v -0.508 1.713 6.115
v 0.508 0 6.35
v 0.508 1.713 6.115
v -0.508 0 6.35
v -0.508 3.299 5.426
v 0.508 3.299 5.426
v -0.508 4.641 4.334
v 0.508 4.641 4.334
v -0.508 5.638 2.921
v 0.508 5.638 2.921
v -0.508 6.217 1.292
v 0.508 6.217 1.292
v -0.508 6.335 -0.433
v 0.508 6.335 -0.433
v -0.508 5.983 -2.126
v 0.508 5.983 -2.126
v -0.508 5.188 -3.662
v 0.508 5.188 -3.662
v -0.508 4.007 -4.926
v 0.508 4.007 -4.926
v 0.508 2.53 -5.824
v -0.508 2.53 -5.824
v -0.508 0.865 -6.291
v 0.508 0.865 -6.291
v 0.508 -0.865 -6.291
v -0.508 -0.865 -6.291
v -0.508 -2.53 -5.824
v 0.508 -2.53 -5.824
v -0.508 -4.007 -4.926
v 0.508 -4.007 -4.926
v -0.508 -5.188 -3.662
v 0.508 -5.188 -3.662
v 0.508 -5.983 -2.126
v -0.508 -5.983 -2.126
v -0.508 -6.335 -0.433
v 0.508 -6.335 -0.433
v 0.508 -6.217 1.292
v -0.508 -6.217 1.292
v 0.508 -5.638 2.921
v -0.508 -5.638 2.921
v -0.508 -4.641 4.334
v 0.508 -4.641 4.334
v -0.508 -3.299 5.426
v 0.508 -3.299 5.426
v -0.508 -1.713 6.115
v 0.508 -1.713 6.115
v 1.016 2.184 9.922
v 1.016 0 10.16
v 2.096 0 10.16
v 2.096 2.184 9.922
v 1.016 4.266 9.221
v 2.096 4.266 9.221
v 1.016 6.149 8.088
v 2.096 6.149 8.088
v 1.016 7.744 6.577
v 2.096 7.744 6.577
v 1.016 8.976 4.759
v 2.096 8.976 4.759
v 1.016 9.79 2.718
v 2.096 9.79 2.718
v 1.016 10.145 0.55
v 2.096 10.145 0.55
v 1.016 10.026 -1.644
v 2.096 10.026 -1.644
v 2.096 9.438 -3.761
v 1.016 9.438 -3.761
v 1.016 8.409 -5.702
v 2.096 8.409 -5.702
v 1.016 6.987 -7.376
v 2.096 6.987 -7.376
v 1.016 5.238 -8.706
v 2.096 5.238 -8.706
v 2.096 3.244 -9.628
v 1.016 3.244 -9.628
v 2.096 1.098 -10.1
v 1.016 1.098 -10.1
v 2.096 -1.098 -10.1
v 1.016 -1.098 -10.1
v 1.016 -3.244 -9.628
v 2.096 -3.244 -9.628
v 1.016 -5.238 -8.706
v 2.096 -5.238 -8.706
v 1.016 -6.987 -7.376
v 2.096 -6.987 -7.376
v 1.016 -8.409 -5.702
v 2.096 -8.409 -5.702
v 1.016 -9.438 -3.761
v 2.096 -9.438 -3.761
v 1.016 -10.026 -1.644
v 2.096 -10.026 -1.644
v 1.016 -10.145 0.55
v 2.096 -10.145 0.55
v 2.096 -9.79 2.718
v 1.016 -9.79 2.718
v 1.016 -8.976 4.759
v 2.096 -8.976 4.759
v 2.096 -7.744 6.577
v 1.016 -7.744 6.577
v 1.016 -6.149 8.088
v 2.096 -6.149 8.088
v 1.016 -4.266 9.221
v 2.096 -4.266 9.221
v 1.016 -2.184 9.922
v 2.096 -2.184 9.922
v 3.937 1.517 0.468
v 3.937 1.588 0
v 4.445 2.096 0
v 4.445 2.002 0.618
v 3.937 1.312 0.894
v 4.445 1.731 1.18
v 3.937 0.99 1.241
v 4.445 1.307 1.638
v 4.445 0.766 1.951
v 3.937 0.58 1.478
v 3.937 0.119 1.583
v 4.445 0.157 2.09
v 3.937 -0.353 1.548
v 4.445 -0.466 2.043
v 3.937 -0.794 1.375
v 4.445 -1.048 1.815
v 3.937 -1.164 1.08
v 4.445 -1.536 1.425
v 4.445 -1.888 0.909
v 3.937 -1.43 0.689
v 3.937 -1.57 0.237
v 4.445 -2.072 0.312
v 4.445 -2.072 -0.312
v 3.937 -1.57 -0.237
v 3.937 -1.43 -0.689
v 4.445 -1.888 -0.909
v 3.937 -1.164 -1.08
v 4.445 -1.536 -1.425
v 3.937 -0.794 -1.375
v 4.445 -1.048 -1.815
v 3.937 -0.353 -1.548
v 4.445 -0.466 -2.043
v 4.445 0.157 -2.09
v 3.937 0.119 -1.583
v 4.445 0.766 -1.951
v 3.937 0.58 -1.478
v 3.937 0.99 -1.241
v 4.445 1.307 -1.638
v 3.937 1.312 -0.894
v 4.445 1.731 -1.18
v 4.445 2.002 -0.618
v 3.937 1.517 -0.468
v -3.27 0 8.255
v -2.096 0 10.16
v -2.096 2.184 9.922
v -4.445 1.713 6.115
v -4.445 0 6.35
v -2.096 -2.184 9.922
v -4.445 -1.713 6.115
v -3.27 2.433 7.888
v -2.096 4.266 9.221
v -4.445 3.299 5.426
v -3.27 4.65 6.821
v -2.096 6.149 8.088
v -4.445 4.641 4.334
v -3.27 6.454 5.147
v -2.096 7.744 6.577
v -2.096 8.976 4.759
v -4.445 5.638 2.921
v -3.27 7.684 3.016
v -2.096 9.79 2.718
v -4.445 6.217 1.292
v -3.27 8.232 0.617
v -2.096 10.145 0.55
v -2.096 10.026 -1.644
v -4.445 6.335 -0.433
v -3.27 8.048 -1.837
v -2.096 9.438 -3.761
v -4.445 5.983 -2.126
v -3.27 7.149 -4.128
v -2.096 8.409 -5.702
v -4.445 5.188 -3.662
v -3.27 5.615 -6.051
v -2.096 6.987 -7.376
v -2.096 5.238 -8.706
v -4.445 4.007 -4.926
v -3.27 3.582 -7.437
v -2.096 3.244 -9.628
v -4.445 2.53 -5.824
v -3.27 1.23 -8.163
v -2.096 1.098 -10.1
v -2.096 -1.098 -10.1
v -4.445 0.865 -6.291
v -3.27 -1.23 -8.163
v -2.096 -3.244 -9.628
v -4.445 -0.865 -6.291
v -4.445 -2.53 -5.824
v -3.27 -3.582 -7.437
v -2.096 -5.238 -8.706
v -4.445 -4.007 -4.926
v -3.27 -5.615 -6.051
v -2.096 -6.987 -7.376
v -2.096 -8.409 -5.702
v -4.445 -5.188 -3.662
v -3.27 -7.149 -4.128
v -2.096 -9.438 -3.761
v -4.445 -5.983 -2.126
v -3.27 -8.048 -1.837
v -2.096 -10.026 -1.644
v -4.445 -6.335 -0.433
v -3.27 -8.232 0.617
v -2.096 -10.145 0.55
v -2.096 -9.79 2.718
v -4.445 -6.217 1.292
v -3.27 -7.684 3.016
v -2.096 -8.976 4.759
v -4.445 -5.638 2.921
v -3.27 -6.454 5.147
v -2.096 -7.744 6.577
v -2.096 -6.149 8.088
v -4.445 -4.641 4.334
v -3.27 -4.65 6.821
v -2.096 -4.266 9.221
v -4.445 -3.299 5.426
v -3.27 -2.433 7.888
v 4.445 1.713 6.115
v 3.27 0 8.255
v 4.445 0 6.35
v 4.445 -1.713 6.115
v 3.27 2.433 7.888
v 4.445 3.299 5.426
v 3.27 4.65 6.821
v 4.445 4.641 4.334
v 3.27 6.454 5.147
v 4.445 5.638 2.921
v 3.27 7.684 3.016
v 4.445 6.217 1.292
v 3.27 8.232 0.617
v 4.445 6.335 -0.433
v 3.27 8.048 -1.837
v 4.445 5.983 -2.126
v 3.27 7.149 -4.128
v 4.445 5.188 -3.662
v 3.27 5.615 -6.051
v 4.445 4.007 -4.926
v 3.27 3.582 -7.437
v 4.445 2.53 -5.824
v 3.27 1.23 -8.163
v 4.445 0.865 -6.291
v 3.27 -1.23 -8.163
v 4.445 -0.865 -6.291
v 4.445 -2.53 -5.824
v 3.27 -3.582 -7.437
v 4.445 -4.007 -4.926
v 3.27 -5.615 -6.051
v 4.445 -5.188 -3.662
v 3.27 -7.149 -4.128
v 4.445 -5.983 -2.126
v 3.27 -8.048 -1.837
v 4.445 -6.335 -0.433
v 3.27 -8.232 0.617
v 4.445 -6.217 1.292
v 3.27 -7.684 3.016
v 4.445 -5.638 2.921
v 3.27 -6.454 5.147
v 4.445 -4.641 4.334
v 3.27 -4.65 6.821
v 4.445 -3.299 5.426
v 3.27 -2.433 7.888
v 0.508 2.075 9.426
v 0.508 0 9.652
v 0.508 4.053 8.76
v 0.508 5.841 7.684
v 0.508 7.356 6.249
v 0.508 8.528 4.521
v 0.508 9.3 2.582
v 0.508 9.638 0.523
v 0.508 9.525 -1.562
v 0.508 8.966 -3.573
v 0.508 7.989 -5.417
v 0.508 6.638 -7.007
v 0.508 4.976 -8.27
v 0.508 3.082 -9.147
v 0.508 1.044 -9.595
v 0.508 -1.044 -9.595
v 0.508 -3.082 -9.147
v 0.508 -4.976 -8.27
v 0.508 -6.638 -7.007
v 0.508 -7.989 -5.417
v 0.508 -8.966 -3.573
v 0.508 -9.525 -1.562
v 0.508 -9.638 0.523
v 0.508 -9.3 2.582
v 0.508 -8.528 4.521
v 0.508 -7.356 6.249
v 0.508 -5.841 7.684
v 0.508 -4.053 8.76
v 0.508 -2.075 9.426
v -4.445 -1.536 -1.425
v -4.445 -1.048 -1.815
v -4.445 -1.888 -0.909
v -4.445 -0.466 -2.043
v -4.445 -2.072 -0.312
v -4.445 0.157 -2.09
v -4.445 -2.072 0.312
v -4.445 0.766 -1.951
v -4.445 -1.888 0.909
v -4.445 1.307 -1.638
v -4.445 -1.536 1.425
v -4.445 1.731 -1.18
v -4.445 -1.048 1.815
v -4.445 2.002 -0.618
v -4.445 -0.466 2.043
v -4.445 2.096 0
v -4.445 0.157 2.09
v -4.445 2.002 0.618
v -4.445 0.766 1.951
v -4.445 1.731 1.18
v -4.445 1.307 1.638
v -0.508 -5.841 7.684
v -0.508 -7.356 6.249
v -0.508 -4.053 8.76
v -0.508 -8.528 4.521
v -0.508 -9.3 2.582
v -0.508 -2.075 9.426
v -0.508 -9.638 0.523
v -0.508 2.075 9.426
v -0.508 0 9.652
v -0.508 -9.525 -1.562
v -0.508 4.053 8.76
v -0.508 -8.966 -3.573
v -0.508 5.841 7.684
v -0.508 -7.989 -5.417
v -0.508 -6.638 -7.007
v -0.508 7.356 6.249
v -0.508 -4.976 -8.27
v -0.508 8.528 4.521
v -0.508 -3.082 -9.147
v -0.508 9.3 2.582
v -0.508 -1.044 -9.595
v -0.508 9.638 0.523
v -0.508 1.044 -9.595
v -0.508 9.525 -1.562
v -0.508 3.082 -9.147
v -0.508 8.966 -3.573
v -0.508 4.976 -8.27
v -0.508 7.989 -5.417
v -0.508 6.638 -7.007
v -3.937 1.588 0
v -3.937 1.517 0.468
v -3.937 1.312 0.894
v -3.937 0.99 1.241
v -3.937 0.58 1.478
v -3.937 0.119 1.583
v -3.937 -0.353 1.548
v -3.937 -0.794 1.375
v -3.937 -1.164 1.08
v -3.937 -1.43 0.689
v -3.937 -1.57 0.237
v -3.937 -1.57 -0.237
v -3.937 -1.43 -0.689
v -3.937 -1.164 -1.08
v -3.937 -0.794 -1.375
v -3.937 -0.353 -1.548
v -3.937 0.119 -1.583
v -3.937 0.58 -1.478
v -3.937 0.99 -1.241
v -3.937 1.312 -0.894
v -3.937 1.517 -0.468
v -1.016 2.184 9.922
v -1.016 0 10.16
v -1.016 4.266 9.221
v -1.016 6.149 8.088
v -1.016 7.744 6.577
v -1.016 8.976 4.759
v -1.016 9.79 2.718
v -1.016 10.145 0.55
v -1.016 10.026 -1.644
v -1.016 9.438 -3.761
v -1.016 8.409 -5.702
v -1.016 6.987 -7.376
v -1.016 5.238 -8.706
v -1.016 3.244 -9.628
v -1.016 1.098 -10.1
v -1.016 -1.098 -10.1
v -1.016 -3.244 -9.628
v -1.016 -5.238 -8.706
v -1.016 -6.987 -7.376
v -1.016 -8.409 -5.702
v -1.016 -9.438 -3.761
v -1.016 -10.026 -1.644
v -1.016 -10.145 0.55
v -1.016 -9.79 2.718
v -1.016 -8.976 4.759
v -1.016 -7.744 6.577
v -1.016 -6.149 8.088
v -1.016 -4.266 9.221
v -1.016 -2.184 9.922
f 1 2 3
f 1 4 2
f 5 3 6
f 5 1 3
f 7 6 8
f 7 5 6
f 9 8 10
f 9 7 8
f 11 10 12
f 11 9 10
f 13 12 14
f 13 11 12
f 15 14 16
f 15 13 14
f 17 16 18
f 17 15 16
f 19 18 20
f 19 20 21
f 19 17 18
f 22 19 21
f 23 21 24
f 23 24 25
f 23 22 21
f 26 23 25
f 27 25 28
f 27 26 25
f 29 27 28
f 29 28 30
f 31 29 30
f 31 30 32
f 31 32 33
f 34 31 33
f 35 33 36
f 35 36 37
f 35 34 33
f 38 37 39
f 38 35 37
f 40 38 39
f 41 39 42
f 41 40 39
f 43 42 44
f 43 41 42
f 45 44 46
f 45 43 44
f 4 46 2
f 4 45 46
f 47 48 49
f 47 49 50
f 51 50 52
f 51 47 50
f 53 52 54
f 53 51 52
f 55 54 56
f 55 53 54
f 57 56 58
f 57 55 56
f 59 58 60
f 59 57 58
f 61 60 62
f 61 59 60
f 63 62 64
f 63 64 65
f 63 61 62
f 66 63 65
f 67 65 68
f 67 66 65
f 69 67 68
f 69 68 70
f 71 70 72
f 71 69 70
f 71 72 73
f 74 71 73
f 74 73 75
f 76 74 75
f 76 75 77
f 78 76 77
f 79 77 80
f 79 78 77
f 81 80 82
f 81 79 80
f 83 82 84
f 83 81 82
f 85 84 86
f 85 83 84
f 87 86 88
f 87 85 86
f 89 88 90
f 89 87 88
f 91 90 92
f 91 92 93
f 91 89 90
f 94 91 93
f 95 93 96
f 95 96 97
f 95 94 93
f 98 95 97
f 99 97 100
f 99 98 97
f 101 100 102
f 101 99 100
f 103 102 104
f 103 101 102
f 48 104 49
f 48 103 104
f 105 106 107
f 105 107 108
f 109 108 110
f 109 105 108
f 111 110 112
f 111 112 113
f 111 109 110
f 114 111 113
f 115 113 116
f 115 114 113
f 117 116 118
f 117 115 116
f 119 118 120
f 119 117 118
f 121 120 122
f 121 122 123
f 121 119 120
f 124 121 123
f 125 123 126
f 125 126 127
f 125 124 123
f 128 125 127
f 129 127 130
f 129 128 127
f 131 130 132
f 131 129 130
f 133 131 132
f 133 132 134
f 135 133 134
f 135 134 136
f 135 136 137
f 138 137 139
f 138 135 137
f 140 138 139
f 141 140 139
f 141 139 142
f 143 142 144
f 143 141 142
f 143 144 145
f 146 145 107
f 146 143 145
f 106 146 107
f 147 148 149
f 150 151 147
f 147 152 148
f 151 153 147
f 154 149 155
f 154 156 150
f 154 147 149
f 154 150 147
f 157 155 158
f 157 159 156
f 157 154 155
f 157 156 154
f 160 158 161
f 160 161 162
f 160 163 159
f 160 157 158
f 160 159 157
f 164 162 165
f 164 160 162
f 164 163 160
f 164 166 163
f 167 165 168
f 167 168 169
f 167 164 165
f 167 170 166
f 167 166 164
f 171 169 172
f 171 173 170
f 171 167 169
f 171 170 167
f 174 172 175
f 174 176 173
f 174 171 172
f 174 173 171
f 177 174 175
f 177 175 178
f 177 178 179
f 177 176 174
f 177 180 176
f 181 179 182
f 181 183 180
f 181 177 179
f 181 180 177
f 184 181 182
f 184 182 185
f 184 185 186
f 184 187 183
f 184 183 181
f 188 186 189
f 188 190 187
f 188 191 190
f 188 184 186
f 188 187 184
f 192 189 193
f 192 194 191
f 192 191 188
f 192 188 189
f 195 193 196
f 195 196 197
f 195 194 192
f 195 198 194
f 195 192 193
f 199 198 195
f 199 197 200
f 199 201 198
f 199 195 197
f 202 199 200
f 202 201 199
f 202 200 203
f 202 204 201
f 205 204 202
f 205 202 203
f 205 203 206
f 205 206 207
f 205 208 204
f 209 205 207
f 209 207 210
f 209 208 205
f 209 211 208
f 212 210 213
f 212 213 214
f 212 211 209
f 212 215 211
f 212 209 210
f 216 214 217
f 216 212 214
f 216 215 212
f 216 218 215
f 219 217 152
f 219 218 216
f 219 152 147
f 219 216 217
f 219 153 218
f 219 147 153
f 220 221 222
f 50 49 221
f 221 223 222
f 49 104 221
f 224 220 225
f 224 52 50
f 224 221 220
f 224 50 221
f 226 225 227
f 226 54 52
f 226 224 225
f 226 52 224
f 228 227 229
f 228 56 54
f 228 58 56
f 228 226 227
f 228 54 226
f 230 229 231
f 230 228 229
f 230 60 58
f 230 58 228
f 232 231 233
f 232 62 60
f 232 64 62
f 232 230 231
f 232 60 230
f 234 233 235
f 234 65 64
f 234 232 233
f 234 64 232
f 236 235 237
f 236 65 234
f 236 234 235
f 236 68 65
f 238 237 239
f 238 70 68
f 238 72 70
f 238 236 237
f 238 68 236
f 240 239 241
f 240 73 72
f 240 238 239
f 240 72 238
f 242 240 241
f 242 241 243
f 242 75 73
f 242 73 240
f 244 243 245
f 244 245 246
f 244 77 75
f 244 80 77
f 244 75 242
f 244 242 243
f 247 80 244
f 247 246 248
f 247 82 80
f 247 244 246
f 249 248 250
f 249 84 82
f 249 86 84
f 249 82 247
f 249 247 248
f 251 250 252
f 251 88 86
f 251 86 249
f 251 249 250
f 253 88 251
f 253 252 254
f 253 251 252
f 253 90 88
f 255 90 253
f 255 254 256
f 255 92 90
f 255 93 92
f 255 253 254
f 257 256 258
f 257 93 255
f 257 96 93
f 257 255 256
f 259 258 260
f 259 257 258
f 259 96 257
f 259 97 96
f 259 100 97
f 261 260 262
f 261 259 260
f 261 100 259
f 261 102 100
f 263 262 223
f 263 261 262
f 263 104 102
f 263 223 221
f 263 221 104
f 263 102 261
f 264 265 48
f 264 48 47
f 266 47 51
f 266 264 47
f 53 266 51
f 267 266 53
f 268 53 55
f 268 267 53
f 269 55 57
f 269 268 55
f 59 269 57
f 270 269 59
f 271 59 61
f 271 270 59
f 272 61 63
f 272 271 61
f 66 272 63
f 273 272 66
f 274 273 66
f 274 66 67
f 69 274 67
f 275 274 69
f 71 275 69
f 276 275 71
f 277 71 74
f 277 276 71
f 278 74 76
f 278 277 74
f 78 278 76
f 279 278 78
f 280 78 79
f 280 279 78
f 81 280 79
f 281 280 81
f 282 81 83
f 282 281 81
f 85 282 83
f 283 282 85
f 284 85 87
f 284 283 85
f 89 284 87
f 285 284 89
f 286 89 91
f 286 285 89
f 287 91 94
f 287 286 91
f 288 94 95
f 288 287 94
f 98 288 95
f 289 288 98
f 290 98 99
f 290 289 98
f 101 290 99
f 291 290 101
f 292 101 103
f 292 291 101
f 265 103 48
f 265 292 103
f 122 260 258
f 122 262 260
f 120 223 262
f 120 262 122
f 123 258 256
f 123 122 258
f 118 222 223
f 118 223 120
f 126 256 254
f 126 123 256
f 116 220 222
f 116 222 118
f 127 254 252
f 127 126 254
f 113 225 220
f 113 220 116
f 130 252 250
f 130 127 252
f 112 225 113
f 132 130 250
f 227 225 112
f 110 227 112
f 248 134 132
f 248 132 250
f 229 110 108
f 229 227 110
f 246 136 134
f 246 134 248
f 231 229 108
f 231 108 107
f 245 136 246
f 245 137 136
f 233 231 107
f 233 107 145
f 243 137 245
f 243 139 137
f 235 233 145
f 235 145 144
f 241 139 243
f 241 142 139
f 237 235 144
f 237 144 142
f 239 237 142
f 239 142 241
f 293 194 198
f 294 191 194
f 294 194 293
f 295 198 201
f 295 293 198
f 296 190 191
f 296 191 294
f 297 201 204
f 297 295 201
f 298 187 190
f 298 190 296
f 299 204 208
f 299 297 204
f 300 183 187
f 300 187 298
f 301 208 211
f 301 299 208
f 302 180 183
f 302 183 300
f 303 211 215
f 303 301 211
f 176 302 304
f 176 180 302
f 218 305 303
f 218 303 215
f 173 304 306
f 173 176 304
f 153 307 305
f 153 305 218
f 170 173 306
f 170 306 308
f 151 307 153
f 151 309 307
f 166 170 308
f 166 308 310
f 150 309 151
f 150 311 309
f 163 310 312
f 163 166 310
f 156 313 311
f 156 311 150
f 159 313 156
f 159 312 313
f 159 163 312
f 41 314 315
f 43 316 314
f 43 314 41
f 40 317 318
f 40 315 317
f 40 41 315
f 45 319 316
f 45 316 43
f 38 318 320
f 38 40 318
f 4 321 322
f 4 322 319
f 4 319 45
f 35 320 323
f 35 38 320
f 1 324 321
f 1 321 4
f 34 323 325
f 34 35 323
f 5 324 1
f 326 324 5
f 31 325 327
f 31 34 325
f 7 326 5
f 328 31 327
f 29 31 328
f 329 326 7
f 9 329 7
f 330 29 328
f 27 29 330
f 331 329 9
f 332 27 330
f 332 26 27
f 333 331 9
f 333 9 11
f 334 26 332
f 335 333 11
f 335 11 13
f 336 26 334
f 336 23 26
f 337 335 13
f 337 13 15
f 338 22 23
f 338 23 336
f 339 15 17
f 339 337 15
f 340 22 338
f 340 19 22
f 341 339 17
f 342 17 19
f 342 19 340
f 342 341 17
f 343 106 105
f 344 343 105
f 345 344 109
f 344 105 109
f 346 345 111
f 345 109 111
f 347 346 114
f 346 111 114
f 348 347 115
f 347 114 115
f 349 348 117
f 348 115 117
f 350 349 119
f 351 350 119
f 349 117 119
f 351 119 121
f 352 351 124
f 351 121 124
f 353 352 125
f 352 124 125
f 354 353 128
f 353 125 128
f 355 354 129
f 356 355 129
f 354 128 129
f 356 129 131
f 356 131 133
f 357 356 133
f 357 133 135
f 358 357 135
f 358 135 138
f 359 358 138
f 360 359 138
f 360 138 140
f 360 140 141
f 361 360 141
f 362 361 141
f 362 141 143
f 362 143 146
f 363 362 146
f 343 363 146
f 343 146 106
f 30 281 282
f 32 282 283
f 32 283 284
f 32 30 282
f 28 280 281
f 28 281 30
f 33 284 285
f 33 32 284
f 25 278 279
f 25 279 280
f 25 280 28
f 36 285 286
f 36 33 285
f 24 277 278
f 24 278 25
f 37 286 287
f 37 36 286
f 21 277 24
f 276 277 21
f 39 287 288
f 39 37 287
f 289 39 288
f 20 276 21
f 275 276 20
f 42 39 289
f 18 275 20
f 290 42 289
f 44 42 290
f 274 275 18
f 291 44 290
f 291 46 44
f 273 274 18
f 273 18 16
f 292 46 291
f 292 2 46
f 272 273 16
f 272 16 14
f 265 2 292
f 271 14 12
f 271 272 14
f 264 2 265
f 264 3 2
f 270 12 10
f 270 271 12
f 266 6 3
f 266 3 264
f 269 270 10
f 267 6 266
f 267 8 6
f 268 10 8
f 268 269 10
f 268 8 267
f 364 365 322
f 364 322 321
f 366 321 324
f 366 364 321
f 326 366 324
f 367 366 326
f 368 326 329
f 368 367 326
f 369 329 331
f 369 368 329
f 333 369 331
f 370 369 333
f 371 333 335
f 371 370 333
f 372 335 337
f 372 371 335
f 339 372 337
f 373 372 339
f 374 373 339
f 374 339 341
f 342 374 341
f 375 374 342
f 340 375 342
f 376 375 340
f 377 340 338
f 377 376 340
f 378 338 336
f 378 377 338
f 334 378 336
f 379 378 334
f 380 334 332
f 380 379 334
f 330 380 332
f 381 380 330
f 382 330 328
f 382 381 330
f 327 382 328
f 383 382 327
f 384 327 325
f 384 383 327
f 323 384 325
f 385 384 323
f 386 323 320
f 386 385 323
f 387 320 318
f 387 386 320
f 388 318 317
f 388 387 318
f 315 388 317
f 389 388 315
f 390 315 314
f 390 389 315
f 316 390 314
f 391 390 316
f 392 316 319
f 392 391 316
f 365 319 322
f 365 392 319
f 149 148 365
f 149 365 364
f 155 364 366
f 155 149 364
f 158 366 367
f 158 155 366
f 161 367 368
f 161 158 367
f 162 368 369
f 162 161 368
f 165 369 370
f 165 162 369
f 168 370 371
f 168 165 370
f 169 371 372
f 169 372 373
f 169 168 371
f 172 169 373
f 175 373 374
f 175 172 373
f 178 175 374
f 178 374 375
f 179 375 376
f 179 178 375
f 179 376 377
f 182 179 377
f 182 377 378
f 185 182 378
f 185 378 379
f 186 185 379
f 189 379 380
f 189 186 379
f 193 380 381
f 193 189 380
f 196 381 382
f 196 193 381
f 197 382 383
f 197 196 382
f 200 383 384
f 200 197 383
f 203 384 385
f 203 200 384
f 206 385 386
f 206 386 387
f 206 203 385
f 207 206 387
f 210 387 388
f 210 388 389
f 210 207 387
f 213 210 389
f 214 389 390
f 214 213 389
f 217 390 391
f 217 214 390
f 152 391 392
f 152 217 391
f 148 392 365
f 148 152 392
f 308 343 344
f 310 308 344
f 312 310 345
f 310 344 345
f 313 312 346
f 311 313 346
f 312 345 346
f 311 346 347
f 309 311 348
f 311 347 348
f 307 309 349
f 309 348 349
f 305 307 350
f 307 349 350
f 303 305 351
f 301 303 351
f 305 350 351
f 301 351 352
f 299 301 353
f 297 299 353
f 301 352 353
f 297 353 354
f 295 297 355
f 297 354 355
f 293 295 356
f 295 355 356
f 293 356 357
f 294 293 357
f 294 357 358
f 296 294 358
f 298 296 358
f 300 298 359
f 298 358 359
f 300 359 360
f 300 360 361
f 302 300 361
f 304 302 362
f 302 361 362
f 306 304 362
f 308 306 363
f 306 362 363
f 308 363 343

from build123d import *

# Parameters (mm, degrees)
F2_R     = 1.5875
F3_DEPTH = 8.891
F4_SIZE  = 0.508
F5_SIZE  = 0.508


with BuildPart() as f1:
    # F0 (on Front) → F1 (revolve)
    with BuildSketch(Plane.XZ):
        Polygon((0.508, 6.35), (0, 6.35), (-0.508, 6.35), (-0.508, 10.16), (-2.0955, 10.16), (-4.445, 6.35), (-4.445, 0), (4.445, 0), (4.445, 6.35), (2.0955, 10.16), (0.508, 10.16), align=None)
    revolve(axis=Axis((0, 0, 0), (-1, 0, 0)))

    # F2 (on face) → F3 (cut, through all)
    with BuildSketch(Plane.YZ.offset(4.445)):
        Circle(F2_R)
    extrude(amount=-F3_DEPTH, mode=Mode.SUBTRACT)

    # F4
    f4_edges = [f1.edges().sort_by_distance(p)[0] for p in [
        (-4.445, -1.5875, 0),
        (4.445, -1.5875, 0),
    ]]
    chamfer(f4_edges, length=F4_SIZE)

    # F5
    f5_edges = [f1.edges().sort_by_distance(p)[0] for p in [
        (-0.508, 0, -10.16),
        (0.508, 0, -10.16),
    ]]
    chamfer(f5_edges, length=F5_SIZE)


solid = f1.part
